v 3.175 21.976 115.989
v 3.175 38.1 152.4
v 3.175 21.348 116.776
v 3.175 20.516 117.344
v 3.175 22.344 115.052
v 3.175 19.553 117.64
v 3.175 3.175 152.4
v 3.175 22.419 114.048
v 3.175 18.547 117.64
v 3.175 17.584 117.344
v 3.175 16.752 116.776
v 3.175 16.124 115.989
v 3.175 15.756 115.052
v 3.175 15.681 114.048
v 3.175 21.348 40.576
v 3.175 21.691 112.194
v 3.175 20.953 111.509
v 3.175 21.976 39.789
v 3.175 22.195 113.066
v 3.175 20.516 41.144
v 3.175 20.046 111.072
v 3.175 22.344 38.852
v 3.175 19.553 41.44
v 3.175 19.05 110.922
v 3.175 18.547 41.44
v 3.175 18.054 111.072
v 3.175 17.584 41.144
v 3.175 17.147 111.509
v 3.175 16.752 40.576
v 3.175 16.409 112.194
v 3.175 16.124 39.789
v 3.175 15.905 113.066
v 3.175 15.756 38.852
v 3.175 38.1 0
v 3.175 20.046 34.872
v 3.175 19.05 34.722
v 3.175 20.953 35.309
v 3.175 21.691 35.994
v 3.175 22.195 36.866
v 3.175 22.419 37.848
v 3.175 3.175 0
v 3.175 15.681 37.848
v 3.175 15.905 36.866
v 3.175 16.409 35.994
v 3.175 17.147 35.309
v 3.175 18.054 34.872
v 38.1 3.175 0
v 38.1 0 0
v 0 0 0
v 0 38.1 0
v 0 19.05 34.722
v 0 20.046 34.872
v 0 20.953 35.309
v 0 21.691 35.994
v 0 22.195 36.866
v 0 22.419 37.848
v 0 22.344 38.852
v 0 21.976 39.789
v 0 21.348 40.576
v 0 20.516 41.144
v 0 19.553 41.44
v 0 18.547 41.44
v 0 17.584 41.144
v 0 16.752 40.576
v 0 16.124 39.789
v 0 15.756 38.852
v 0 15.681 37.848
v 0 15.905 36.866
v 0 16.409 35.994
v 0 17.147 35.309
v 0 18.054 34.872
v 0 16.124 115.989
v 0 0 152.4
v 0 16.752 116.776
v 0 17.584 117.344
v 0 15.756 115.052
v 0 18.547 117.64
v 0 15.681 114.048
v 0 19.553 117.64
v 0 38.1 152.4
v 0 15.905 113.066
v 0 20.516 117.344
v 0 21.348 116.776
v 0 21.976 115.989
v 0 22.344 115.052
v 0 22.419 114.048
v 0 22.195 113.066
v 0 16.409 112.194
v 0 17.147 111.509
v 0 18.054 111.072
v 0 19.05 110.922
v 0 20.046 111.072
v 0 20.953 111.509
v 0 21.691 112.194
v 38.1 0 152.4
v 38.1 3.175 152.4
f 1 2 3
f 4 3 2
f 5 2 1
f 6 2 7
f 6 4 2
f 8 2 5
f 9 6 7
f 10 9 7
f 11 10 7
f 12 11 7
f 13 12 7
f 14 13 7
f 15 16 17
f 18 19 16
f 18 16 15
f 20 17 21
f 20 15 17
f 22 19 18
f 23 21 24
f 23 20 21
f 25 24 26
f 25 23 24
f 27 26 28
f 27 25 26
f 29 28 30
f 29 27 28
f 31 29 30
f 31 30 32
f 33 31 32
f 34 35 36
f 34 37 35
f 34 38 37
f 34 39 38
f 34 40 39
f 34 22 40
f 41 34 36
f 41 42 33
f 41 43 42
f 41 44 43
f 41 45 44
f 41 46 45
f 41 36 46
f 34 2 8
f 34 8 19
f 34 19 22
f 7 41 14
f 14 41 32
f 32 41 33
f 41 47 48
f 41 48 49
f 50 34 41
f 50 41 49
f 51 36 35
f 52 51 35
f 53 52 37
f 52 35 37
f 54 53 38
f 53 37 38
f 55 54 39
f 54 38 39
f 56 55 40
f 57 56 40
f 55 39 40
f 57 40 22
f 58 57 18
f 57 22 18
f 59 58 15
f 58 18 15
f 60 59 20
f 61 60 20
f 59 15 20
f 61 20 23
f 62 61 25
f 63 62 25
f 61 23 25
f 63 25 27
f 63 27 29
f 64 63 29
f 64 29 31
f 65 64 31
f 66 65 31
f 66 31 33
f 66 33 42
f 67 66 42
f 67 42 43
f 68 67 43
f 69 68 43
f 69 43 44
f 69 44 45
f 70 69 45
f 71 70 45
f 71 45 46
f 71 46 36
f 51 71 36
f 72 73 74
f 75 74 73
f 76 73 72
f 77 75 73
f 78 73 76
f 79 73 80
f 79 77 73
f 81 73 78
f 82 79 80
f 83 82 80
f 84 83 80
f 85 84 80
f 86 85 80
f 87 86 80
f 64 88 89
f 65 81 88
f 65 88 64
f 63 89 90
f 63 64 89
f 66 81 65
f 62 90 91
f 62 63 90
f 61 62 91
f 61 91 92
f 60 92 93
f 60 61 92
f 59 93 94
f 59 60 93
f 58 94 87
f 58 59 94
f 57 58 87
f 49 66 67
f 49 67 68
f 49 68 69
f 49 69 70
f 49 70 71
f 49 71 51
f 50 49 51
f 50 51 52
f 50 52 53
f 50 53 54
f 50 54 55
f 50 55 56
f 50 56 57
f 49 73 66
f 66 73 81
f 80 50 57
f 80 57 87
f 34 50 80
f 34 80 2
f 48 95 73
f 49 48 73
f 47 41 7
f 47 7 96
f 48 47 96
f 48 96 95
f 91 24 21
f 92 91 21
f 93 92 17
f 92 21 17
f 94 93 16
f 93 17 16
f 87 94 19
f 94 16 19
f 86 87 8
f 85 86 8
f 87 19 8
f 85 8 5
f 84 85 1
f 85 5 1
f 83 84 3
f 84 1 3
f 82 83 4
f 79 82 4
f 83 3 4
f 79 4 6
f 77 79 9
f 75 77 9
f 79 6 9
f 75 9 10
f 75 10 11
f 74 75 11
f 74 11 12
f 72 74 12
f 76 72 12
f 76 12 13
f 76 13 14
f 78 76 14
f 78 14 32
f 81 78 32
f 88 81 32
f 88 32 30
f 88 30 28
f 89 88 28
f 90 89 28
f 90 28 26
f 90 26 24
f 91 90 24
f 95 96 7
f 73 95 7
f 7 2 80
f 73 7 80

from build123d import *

# Parameters (mm, degrees)
BOSS_EXTRUDE1_DEPTH     = 152.4
F_1_4_CLEARANCE_HOLE1_D = 6.7564


with BuildPart() as part:
    # Sketch1 → Boss-Extrude1 (new body)
    with BuildSketch(Plane.XY):
        Polygon((0, 0), (0, 38.1), (3.175, 38.1), (3.175, 3.175), (38.1, 3.175), (38.1, 0), align=None)
    extrude(amount=BOSS_EXTRUDE1_DEPTH)

    # 1/4 Clearance Hole1 (through all)
    with Locations(Plane.ZY):
        with Locations((38.1, 19.05), (114.3, 19.05)):
            Hole(F_1_4_CLEARANCE_HOLE1_D / 2)


solid = part.part
